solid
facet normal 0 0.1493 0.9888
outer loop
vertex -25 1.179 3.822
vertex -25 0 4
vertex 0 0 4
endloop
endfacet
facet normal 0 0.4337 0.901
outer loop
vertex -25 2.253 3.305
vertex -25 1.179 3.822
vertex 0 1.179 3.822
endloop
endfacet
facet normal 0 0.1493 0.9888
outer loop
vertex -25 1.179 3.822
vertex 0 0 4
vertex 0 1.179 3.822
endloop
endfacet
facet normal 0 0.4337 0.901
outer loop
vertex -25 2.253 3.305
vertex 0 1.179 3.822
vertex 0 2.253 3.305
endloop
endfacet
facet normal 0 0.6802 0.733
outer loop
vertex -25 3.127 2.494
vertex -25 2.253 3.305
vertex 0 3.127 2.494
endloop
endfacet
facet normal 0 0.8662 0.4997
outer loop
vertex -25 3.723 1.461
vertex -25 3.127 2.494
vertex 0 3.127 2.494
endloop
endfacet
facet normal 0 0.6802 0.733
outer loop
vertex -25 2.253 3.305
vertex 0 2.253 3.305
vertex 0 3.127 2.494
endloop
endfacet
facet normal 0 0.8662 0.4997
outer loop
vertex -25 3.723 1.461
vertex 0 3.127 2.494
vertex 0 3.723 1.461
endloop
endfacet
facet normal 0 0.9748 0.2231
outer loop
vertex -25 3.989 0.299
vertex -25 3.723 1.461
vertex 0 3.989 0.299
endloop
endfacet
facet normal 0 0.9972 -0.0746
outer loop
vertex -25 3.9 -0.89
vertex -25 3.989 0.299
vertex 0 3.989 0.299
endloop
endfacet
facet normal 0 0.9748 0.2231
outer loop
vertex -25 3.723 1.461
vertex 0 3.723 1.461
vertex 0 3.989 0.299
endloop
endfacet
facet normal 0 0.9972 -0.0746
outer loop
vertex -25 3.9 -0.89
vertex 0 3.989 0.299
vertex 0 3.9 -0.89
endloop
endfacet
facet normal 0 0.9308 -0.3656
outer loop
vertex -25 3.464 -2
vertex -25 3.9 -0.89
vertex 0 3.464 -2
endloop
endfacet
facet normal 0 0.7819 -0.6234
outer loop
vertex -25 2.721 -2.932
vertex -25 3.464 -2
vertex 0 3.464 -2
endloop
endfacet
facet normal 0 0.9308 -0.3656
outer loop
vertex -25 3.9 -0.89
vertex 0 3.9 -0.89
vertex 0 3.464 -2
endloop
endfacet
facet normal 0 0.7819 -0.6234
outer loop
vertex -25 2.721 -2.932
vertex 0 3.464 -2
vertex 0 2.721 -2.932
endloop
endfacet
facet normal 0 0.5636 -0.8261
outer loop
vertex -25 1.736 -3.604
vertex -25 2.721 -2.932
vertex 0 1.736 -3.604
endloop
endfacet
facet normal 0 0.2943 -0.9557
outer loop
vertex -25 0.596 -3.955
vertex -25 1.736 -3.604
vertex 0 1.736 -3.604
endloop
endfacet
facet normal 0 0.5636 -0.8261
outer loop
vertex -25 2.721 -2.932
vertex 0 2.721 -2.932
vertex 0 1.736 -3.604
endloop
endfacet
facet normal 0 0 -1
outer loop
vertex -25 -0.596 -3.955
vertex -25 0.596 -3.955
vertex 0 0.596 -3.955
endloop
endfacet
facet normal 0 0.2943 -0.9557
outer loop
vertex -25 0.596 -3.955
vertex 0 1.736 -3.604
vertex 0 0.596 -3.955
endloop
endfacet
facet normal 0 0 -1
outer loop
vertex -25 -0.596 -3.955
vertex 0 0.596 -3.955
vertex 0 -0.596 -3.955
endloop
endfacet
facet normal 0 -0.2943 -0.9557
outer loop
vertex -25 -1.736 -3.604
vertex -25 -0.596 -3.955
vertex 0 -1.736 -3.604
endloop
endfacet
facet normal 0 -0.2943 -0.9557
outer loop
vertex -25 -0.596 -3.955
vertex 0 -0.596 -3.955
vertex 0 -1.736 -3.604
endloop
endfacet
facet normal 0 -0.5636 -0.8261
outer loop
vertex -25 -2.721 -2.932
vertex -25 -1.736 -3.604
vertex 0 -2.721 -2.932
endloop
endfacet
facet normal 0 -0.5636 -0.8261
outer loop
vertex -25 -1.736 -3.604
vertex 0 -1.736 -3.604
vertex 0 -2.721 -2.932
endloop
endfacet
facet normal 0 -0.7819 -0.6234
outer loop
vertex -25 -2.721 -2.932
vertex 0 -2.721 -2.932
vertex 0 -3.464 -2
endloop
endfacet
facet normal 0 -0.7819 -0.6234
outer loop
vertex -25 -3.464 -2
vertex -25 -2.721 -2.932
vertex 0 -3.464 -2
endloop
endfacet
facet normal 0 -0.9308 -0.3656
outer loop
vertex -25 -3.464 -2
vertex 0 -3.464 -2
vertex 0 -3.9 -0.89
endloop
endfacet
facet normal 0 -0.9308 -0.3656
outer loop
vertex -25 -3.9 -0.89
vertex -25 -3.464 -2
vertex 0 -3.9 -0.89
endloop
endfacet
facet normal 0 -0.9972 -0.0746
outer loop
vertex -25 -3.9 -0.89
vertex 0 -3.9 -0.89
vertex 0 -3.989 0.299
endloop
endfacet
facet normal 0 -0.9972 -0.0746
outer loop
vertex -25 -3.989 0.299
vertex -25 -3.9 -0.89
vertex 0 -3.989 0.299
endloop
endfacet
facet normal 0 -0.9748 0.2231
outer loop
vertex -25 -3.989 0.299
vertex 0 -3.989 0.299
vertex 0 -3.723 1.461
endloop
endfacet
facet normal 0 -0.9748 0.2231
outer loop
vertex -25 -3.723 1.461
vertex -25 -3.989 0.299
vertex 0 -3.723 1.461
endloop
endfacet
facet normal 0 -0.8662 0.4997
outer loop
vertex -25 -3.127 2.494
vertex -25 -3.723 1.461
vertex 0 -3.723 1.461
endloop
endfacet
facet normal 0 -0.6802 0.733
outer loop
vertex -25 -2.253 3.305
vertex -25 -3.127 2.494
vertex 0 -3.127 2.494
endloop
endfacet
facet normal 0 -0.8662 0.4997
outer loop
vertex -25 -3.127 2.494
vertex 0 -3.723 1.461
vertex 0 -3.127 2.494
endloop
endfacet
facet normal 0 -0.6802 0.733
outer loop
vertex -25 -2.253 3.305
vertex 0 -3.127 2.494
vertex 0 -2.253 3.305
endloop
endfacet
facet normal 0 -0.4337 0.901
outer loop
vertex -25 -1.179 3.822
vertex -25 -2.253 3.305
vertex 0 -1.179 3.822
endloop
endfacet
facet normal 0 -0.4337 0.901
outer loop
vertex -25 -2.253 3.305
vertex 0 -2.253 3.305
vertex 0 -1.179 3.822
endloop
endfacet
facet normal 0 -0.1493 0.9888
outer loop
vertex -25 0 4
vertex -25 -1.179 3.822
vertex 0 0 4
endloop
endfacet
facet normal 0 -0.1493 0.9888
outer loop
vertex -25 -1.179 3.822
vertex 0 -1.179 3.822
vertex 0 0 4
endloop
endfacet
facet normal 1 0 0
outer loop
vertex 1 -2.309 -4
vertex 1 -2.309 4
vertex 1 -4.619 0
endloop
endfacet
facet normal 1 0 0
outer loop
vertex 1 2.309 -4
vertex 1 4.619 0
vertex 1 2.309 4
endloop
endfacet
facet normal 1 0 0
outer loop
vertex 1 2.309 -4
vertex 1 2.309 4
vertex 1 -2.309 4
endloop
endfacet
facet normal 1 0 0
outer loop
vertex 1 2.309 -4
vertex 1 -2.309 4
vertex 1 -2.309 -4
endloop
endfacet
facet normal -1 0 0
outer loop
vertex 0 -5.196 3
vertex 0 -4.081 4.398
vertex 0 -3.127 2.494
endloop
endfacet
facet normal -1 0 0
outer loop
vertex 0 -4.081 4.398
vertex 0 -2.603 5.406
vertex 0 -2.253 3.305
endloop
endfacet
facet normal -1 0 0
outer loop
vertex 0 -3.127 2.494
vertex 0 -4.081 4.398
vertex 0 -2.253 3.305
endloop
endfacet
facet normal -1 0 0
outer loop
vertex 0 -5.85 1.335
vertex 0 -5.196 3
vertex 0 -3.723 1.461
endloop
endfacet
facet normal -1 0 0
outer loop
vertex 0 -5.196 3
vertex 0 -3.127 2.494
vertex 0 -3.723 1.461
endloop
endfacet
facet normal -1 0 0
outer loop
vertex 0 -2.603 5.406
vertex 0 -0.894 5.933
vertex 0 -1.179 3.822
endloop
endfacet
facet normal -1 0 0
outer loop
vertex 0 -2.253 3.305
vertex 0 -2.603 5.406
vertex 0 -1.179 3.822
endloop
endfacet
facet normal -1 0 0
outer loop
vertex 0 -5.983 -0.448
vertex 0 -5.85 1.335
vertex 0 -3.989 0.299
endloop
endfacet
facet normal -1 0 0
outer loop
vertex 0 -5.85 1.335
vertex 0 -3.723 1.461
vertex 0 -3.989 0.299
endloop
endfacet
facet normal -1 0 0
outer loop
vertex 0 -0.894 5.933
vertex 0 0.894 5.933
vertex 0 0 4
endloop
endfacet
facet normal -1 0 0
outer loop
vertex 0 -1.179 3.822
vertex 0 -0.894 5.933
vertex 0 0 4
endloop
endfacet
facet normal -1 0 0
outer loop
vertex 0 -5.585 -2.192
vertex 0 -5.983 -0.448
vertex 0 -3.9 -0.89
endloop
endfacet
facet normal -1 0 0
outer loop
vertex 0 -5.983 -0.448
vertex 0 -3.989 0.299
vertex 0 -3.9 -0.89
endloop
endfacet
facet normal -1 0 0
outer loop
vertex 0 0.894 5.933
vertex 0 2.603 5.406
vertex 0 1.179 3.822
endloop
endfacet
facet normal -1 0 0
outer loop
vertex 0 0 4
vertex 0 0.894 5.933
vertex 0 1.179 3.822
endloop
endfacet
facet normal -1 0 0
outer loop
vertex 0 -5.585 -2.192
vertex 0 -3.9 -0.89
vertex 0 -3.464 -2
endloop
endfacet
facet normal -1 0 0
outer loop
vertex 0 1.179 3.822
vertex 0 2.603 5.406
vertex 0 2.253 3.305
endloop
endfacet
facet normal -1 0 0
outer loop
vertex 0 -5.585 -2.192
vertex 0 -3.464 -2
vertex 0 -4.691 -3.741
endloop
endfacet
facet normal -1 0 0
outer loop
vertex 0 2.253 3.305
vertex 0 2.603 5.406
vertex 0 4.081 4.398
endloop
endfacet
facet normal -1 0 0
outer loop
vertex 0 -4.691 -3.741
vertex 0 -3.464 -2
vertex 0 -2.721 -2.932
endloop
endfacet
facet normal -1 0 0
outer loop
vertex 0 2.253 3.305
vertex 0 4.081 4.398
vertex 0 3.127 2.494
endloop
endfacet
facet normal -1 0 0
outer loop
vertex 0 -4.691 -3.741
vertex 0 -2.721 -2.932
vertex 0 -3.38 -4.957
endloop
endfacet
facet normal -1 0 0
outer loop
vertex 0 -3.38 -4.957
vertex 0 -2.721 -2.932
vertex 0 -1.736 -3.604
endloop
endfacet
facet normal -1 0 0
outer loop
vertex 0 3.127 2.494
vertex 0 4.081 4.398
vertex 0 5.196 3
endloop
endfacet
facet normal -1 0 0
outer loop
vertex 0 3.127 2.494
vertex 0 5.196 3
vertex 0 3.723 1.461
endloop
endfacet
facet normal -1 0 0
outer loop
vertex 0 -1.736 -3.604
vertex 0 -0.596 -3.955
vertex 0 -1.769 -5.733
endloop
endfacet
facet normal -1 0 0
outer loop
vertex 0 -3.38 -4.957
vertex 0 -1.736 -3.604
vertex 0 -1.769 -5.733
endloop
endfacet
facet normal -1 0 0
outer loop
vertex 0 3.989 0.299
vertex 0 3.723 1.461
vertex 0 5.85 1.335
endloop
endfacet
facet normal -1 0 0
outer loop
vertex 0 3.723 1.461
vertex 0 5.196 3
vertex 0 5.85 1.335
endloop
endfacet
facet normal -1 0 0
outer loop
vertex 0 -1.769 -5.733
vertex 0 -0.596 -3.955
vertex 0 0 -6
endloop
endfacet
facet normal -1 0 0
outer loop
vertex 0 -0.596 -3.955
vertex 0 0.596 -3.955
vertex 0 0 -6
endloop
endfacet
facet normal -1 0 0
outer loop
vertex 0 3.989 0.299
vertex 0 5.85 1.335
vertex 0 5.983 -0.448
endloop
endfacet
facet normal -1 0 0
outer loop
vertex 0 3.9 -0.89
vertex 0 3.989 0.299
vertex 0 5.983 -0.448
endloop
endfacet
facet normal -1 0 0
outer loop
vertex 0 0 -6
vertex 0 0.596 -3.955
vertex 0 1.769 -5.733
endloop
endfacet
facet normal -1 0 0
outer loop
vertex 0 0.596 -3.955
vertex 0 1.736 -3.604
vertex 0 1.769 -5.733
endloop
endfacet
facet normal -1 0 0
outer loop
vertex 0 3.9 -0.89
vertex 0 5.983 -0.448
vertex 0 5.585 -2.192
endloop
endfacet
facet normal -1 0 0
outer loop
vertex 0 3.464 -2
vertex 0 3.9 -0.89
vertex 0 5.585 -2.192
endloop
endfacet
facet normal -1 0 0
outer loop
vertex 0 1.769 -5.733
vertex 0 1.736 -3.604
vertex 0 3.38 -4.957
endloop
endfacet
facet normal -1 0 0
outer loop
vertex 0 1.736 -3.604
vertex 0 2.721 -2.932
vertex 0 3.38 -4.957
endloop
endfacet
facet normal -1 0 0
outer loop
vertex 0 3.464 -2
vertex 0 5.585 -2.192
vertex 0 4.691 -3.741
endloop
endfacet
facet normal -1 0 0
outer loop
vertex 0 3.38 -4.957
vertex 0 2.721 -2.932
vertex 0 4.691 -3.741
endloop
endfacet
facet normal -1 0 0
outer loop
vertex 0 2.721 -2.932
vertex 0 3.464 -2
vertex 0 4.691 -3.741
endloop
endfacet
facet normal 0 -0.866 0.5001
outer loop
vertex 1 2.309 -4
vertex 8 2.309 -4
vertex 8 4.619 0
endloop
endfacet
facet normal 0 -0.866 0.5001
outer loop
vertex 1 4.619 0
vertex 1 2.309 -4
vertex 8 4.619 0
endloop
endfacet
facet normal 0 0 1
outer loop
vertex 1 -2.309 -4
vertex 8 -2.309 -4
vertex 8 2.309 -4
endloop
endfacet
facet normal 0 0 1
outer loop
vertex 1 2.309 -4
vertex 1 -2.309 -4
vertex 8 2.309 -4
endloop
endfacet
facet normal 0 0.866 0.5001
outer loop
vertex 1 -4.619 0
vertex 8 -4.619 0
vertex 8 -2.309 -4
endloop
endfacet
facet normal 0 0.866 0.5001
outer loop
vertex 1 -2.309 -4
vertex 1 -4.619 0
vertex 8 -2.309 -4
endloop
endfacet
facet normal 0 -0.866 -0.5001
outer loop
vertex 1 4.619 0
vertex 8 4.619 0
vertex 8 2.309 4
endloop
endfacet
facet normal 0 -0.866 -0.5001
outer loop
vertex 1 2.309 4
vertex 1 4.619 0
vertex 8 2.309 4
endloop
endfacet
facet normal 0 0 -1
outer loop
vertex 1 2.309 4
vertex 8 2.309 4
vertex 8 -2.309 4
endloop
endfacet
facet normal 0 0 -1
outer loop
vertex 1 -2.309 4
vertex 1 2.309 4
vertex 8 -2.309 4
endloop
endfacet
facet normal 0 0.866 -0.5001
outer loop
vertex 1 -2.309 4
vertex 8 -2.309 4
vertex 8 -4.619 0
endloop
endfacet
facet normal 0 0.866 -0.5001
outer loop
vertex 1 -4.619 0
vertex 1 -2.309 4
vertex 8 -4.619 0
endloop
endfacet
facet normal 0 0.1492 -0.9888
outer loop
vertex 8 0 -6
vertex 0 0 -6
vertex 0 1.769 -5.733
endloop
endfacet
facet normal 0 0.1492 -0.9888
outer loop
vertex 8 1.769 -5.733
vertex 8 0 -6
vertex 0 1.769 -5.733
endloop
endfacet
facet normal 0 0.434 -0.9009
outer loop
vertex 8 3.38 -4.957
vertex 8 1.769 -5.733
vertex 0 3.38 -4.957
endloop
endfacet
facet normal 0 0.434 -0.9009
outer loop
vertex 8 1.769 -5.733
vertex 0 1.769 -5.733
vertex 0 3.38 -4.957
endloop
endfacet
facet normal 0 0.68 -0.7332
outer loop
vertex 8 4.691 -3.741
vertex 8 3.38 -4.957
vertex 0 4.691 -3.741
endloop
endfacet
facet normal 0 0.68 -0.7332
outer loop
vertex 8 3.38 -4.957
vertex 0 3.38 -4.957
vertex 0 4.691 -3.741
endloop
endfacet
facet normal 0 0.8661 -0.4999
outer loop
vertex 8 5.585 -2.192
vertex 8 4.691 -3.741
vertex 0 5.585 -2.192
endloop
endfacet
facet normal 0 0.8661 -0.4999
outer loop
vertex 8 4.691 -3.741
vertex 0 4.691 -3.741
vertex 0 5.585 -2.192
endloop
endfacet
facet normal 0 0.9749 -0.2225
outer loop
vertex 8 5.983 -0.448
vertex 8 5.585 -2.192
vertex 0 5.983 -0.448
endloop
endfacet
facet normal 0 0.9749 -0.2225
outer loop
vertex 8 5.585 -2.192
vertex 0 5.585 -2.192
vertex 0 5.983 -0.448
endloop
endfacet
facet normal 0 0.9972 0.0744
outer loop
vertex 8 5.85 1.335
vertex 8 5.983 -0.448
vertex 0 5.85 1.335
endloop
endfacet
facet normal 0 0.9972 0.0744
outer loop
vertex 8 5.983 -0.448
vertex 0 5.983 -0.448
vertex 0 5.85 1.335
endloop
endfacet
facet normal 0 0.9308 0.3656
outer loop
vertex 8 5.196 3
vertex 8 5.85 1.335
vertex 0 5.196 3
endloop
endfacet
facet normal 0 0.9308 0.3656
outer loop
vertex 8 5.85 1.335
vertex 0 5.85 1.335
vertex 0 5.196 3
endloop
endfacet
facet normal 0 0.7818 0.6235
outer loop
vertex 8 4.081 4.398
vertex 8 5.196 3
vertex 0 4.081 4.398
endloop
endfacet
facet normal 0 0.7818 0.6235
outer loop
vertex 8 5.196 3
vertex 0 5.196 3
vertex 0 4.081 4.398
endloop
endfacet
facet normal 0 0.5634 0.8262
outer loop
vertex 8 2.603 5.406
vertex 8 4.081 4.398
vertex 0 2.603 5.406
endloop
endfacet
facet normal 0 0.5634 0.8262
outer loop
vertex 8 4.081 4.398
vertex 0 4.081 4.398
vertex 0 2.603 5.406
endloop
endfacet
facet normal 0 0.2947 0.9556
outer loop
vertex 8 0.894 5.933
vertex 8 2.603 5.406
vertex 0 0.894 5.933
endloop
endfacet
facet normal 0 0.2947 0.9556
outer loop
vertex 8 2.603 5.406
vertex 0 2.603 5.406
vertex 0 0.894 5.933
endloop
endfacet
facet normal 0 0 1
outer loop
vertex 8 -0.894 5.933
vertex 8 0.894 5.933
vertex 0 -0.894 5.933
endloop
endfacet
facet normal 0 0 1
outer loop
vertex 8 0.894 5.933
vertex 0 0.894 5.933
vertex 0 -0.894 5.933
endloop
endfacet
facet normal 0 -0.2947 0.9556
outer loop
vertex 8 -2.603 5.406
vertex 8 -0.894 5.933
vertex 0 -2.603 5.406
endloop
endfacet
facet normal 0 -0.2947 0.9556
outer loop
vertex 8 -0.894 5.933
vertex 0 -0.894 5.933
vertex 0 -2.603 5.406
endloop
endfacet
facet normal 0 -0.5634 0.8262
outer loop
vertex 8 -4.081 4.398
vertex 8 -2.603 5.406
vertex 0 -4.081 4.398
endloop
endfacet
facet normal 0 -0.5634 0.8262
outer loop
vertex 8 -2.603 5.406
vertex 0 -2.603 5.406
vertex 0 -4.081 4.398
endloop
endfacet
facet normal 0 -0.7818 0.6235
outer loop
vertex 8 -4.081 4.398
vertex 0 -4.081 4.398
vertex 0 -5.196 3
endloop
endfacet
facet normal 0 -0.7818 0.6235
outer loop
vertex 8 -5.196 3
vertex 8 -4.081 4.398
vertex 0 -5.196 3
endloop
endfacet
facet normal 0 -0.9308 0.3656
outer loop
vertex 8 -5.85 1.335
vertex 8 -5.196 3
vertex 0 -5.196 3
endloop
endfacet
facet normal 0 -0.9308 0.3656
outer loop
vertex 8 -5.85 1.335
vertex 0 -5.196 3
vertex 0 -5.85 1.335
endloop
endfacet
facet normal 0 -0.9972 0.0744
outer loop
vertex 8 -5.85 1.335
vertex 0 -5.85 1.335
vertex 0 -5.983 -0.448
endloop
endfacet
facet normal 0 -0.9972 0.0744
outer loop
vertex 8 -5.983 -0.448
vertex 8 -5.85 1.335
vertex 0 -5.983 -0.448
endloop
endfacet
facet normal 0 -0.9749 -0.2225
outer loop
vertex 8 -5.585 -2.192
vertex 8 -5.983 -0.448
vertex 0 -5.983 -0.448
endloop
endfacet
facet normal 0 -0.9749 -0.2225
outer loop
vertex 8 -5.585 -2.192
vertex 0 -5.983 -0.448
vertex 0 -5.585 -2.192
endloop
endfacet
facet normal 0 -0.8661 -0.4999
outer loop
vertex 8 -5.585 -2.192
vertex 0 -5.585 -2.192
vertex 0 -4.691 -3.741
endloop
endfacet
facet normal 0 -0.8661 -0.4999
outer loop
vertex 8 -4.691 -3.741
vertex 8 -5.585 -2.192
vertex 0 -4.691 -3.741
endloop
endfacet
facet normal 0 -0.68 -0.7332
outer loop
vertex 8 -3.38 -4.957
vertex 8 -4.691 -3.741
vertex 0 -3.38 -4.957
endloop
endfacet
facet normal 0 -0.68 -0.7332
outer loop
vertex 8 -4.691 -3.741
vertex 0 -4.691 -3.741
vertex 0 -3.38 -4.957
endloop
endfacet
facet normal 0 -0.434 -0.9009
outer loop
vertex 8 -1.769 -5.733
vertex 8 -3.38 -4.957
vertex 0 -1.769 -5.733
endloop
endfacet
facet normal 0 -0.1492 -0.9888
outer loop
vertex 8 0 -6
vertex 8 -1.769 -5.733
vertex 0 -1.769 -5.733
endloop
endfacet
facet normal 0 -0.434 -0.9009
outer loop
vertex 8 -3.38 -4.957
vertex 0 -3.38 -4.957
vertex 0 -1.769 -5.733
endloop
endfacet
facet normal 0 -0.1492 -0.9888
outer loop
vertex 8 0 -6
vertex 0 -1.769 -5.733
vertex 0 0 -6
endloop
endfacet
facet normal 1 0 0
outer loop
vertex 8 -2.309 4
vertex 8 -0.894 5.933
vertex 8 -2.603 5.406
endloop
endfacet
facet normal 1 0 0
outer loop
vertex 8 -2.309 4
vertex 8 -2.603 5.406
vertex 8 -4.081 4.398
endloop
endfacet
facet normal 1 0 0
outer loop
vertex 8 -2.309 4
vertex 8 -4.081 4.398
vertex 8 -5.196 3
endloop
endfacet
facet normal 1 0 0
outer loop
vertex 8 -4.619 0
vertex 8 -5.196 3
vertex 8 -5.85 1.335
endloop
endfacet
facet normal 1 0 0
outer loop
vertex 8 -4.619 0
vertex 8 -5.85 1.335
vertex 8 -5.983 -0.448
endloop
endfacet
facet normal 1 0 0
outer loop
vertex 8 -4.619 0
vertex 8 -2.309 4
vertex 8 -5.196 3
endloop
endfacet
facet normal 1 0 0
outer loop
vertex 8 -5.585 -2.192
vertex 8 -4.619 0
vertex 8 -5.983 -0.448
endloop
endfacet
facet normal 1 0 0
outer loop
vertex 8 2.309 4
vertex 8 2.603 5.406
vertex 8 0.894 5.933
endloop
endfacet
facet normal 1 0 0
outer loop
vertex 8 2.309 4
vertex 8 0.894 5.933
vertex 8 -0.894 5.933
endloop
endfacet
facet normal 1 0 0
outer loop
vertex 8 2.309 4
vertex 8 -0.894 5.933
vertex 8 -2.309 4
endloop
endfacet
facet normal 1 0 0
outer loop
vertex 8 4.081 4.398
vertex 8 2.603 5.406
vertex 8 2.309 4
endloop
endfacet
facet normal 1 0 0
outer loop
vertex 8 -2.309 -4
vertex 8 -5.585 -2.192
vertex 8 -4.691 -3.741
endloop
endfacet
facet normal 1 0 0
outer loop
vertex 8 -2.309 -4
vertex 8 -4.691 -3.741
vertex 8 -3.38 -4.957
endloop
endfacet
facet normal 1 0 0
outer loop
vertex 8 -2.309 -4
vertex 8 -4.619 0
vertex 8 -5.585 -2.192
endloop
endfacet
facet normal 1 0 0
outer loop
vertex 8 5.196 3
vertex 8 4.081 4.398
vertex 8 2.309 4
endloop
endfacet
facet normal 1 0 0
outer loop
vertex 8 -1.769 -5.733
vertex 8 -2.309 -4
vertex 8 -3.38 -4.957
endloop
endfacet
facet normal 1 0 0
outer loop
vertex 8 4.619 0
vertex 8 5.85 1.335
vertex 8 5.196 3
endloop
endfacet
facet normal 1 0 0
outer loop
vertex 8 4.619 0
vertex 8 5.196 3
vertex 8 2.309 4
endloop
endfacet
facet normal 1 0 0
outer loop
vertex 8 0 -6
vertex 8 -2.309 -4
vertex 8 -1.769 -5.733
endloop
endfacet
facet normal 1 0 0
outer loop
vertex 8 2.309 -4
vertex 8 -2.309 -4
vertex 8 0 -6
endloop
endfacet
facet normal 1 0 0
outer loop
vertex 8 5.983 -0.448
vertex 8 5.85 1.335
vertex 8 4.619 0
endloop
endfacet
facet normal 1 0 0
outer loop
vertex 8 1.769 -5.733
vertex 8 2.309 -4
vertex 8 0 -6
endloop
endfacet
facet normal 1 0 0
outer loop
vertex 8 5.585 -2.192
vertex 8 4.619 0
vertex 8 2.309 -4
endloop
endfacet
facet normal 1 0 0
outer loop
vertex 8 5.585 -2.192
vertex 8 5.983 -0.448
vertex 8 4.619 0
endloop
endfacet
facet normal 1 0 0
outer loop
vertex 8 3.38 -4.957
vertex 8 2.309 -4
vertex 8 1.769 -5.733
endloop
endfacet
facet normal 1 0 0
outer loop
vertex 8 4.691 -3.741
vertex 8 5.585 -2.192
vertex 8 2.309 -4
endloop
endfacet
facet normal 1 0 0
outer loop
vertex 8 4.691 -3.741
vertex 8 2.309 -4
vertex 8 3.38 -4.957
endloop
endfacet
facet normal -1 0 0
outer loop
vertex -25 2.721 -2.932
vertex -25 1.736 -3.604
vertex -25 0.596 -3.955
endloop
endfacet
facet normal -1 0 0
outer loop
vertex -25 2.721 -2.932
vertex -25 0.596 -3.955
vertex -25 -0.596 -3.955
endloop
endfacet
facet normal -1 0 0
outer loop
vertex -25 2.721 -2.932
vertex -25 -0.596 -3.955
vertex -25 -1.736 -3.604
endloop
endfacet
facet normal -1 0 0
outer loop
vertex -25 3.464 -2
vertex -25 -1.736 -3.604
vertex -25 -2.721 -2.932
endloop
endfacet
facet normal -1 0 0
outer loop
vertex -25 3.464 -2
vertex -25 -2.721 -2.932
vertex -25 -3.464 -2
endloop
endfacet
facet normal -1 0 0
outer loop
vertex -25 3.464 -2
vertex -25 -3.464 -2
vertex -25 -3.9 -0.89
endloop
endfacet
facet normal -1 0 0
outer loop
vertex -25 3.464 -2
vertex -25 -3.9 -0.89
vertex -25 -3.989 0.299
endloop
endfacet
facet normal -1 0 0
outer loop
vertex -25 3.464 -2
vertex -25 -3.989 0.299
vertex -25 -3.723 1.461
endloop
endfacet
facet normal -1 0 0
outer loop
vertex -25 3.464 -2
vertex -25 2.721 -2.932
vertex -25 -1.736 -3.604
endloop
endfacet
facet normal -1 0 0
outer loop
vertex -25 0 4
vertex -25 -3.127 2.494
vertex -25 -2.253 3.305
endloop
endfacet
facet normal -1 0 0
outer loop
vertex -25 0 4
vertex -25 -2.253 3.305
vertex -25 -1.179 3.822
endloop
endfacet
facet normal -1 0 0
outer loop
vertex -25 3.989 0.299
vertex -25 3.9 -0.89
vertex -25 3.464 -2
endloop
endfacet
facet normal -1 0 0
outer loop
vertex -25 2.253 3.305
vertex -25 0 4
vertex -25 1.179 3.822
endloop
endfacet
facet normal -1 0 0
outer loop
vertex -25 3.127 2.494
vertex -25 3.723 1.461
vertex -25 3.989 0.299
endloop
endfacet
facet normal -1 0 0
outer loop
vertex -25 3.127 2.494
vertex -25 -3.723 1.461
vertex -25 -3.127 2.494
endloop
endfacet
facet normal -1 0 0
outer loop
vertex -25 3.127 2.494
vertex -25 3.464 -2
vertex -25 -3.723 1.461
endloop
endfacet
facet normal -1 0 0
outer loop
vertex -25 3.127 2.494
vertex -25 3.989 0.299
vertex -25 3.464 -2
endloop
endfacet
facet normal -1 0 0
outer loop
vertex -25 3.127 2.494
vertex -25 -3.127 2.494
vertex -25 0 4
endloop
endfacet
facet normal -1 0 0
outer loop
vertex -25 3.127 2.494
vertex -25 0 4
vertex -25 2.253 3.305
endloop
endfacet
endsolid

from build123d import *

# Parameters (mm, degrees)
SKETCH2_R           = 6
BOSS_EXTRUDE1_DEPTH = 8
SKETCH4_R           = 4
BOSS_EXTRUDE2_DEPTH = 25
CUT_EXTRUDE1_DEPTH  = 7


with BuildPart() as part:
    # Sketch2 → Boss-Extrude1 (new body)
    with BuildSketch(Plane(origin=(0, 0, 0), x_dir=(0, 0, -1), z_dir=(1, 0, 0))):
        Circle(SKETCH2_R)
    extrude(amount=BOSS_EXTRUDE1_DEPTH)

    # Sketch4 → Boss-Extrude2 (add)
    with BuildSketch(Plane.ZY):
        Circle(SKETCH4_R)
    extrude(amount=BOSS_EXTRUDE2_DEPTH)

    # Sketch3 → Cut-Extrude1 (cut)
    with BuildSketch(Plane(origin=(8, 0, 0), x_dir=(0, 0, -1), z_dir=(1, 0, 0))):
        Polygon((4, 2.309401077), (0, 4.618802154), (-4, 2.309401077), (-4, -2.309401077), (0, -4.618802154), (4, -2.309401077), align=None)
    extrude(amount=-CUT_EXTRUDE1_DEPTH, mode=Mode.SUBTRACT)


solid = part.part
